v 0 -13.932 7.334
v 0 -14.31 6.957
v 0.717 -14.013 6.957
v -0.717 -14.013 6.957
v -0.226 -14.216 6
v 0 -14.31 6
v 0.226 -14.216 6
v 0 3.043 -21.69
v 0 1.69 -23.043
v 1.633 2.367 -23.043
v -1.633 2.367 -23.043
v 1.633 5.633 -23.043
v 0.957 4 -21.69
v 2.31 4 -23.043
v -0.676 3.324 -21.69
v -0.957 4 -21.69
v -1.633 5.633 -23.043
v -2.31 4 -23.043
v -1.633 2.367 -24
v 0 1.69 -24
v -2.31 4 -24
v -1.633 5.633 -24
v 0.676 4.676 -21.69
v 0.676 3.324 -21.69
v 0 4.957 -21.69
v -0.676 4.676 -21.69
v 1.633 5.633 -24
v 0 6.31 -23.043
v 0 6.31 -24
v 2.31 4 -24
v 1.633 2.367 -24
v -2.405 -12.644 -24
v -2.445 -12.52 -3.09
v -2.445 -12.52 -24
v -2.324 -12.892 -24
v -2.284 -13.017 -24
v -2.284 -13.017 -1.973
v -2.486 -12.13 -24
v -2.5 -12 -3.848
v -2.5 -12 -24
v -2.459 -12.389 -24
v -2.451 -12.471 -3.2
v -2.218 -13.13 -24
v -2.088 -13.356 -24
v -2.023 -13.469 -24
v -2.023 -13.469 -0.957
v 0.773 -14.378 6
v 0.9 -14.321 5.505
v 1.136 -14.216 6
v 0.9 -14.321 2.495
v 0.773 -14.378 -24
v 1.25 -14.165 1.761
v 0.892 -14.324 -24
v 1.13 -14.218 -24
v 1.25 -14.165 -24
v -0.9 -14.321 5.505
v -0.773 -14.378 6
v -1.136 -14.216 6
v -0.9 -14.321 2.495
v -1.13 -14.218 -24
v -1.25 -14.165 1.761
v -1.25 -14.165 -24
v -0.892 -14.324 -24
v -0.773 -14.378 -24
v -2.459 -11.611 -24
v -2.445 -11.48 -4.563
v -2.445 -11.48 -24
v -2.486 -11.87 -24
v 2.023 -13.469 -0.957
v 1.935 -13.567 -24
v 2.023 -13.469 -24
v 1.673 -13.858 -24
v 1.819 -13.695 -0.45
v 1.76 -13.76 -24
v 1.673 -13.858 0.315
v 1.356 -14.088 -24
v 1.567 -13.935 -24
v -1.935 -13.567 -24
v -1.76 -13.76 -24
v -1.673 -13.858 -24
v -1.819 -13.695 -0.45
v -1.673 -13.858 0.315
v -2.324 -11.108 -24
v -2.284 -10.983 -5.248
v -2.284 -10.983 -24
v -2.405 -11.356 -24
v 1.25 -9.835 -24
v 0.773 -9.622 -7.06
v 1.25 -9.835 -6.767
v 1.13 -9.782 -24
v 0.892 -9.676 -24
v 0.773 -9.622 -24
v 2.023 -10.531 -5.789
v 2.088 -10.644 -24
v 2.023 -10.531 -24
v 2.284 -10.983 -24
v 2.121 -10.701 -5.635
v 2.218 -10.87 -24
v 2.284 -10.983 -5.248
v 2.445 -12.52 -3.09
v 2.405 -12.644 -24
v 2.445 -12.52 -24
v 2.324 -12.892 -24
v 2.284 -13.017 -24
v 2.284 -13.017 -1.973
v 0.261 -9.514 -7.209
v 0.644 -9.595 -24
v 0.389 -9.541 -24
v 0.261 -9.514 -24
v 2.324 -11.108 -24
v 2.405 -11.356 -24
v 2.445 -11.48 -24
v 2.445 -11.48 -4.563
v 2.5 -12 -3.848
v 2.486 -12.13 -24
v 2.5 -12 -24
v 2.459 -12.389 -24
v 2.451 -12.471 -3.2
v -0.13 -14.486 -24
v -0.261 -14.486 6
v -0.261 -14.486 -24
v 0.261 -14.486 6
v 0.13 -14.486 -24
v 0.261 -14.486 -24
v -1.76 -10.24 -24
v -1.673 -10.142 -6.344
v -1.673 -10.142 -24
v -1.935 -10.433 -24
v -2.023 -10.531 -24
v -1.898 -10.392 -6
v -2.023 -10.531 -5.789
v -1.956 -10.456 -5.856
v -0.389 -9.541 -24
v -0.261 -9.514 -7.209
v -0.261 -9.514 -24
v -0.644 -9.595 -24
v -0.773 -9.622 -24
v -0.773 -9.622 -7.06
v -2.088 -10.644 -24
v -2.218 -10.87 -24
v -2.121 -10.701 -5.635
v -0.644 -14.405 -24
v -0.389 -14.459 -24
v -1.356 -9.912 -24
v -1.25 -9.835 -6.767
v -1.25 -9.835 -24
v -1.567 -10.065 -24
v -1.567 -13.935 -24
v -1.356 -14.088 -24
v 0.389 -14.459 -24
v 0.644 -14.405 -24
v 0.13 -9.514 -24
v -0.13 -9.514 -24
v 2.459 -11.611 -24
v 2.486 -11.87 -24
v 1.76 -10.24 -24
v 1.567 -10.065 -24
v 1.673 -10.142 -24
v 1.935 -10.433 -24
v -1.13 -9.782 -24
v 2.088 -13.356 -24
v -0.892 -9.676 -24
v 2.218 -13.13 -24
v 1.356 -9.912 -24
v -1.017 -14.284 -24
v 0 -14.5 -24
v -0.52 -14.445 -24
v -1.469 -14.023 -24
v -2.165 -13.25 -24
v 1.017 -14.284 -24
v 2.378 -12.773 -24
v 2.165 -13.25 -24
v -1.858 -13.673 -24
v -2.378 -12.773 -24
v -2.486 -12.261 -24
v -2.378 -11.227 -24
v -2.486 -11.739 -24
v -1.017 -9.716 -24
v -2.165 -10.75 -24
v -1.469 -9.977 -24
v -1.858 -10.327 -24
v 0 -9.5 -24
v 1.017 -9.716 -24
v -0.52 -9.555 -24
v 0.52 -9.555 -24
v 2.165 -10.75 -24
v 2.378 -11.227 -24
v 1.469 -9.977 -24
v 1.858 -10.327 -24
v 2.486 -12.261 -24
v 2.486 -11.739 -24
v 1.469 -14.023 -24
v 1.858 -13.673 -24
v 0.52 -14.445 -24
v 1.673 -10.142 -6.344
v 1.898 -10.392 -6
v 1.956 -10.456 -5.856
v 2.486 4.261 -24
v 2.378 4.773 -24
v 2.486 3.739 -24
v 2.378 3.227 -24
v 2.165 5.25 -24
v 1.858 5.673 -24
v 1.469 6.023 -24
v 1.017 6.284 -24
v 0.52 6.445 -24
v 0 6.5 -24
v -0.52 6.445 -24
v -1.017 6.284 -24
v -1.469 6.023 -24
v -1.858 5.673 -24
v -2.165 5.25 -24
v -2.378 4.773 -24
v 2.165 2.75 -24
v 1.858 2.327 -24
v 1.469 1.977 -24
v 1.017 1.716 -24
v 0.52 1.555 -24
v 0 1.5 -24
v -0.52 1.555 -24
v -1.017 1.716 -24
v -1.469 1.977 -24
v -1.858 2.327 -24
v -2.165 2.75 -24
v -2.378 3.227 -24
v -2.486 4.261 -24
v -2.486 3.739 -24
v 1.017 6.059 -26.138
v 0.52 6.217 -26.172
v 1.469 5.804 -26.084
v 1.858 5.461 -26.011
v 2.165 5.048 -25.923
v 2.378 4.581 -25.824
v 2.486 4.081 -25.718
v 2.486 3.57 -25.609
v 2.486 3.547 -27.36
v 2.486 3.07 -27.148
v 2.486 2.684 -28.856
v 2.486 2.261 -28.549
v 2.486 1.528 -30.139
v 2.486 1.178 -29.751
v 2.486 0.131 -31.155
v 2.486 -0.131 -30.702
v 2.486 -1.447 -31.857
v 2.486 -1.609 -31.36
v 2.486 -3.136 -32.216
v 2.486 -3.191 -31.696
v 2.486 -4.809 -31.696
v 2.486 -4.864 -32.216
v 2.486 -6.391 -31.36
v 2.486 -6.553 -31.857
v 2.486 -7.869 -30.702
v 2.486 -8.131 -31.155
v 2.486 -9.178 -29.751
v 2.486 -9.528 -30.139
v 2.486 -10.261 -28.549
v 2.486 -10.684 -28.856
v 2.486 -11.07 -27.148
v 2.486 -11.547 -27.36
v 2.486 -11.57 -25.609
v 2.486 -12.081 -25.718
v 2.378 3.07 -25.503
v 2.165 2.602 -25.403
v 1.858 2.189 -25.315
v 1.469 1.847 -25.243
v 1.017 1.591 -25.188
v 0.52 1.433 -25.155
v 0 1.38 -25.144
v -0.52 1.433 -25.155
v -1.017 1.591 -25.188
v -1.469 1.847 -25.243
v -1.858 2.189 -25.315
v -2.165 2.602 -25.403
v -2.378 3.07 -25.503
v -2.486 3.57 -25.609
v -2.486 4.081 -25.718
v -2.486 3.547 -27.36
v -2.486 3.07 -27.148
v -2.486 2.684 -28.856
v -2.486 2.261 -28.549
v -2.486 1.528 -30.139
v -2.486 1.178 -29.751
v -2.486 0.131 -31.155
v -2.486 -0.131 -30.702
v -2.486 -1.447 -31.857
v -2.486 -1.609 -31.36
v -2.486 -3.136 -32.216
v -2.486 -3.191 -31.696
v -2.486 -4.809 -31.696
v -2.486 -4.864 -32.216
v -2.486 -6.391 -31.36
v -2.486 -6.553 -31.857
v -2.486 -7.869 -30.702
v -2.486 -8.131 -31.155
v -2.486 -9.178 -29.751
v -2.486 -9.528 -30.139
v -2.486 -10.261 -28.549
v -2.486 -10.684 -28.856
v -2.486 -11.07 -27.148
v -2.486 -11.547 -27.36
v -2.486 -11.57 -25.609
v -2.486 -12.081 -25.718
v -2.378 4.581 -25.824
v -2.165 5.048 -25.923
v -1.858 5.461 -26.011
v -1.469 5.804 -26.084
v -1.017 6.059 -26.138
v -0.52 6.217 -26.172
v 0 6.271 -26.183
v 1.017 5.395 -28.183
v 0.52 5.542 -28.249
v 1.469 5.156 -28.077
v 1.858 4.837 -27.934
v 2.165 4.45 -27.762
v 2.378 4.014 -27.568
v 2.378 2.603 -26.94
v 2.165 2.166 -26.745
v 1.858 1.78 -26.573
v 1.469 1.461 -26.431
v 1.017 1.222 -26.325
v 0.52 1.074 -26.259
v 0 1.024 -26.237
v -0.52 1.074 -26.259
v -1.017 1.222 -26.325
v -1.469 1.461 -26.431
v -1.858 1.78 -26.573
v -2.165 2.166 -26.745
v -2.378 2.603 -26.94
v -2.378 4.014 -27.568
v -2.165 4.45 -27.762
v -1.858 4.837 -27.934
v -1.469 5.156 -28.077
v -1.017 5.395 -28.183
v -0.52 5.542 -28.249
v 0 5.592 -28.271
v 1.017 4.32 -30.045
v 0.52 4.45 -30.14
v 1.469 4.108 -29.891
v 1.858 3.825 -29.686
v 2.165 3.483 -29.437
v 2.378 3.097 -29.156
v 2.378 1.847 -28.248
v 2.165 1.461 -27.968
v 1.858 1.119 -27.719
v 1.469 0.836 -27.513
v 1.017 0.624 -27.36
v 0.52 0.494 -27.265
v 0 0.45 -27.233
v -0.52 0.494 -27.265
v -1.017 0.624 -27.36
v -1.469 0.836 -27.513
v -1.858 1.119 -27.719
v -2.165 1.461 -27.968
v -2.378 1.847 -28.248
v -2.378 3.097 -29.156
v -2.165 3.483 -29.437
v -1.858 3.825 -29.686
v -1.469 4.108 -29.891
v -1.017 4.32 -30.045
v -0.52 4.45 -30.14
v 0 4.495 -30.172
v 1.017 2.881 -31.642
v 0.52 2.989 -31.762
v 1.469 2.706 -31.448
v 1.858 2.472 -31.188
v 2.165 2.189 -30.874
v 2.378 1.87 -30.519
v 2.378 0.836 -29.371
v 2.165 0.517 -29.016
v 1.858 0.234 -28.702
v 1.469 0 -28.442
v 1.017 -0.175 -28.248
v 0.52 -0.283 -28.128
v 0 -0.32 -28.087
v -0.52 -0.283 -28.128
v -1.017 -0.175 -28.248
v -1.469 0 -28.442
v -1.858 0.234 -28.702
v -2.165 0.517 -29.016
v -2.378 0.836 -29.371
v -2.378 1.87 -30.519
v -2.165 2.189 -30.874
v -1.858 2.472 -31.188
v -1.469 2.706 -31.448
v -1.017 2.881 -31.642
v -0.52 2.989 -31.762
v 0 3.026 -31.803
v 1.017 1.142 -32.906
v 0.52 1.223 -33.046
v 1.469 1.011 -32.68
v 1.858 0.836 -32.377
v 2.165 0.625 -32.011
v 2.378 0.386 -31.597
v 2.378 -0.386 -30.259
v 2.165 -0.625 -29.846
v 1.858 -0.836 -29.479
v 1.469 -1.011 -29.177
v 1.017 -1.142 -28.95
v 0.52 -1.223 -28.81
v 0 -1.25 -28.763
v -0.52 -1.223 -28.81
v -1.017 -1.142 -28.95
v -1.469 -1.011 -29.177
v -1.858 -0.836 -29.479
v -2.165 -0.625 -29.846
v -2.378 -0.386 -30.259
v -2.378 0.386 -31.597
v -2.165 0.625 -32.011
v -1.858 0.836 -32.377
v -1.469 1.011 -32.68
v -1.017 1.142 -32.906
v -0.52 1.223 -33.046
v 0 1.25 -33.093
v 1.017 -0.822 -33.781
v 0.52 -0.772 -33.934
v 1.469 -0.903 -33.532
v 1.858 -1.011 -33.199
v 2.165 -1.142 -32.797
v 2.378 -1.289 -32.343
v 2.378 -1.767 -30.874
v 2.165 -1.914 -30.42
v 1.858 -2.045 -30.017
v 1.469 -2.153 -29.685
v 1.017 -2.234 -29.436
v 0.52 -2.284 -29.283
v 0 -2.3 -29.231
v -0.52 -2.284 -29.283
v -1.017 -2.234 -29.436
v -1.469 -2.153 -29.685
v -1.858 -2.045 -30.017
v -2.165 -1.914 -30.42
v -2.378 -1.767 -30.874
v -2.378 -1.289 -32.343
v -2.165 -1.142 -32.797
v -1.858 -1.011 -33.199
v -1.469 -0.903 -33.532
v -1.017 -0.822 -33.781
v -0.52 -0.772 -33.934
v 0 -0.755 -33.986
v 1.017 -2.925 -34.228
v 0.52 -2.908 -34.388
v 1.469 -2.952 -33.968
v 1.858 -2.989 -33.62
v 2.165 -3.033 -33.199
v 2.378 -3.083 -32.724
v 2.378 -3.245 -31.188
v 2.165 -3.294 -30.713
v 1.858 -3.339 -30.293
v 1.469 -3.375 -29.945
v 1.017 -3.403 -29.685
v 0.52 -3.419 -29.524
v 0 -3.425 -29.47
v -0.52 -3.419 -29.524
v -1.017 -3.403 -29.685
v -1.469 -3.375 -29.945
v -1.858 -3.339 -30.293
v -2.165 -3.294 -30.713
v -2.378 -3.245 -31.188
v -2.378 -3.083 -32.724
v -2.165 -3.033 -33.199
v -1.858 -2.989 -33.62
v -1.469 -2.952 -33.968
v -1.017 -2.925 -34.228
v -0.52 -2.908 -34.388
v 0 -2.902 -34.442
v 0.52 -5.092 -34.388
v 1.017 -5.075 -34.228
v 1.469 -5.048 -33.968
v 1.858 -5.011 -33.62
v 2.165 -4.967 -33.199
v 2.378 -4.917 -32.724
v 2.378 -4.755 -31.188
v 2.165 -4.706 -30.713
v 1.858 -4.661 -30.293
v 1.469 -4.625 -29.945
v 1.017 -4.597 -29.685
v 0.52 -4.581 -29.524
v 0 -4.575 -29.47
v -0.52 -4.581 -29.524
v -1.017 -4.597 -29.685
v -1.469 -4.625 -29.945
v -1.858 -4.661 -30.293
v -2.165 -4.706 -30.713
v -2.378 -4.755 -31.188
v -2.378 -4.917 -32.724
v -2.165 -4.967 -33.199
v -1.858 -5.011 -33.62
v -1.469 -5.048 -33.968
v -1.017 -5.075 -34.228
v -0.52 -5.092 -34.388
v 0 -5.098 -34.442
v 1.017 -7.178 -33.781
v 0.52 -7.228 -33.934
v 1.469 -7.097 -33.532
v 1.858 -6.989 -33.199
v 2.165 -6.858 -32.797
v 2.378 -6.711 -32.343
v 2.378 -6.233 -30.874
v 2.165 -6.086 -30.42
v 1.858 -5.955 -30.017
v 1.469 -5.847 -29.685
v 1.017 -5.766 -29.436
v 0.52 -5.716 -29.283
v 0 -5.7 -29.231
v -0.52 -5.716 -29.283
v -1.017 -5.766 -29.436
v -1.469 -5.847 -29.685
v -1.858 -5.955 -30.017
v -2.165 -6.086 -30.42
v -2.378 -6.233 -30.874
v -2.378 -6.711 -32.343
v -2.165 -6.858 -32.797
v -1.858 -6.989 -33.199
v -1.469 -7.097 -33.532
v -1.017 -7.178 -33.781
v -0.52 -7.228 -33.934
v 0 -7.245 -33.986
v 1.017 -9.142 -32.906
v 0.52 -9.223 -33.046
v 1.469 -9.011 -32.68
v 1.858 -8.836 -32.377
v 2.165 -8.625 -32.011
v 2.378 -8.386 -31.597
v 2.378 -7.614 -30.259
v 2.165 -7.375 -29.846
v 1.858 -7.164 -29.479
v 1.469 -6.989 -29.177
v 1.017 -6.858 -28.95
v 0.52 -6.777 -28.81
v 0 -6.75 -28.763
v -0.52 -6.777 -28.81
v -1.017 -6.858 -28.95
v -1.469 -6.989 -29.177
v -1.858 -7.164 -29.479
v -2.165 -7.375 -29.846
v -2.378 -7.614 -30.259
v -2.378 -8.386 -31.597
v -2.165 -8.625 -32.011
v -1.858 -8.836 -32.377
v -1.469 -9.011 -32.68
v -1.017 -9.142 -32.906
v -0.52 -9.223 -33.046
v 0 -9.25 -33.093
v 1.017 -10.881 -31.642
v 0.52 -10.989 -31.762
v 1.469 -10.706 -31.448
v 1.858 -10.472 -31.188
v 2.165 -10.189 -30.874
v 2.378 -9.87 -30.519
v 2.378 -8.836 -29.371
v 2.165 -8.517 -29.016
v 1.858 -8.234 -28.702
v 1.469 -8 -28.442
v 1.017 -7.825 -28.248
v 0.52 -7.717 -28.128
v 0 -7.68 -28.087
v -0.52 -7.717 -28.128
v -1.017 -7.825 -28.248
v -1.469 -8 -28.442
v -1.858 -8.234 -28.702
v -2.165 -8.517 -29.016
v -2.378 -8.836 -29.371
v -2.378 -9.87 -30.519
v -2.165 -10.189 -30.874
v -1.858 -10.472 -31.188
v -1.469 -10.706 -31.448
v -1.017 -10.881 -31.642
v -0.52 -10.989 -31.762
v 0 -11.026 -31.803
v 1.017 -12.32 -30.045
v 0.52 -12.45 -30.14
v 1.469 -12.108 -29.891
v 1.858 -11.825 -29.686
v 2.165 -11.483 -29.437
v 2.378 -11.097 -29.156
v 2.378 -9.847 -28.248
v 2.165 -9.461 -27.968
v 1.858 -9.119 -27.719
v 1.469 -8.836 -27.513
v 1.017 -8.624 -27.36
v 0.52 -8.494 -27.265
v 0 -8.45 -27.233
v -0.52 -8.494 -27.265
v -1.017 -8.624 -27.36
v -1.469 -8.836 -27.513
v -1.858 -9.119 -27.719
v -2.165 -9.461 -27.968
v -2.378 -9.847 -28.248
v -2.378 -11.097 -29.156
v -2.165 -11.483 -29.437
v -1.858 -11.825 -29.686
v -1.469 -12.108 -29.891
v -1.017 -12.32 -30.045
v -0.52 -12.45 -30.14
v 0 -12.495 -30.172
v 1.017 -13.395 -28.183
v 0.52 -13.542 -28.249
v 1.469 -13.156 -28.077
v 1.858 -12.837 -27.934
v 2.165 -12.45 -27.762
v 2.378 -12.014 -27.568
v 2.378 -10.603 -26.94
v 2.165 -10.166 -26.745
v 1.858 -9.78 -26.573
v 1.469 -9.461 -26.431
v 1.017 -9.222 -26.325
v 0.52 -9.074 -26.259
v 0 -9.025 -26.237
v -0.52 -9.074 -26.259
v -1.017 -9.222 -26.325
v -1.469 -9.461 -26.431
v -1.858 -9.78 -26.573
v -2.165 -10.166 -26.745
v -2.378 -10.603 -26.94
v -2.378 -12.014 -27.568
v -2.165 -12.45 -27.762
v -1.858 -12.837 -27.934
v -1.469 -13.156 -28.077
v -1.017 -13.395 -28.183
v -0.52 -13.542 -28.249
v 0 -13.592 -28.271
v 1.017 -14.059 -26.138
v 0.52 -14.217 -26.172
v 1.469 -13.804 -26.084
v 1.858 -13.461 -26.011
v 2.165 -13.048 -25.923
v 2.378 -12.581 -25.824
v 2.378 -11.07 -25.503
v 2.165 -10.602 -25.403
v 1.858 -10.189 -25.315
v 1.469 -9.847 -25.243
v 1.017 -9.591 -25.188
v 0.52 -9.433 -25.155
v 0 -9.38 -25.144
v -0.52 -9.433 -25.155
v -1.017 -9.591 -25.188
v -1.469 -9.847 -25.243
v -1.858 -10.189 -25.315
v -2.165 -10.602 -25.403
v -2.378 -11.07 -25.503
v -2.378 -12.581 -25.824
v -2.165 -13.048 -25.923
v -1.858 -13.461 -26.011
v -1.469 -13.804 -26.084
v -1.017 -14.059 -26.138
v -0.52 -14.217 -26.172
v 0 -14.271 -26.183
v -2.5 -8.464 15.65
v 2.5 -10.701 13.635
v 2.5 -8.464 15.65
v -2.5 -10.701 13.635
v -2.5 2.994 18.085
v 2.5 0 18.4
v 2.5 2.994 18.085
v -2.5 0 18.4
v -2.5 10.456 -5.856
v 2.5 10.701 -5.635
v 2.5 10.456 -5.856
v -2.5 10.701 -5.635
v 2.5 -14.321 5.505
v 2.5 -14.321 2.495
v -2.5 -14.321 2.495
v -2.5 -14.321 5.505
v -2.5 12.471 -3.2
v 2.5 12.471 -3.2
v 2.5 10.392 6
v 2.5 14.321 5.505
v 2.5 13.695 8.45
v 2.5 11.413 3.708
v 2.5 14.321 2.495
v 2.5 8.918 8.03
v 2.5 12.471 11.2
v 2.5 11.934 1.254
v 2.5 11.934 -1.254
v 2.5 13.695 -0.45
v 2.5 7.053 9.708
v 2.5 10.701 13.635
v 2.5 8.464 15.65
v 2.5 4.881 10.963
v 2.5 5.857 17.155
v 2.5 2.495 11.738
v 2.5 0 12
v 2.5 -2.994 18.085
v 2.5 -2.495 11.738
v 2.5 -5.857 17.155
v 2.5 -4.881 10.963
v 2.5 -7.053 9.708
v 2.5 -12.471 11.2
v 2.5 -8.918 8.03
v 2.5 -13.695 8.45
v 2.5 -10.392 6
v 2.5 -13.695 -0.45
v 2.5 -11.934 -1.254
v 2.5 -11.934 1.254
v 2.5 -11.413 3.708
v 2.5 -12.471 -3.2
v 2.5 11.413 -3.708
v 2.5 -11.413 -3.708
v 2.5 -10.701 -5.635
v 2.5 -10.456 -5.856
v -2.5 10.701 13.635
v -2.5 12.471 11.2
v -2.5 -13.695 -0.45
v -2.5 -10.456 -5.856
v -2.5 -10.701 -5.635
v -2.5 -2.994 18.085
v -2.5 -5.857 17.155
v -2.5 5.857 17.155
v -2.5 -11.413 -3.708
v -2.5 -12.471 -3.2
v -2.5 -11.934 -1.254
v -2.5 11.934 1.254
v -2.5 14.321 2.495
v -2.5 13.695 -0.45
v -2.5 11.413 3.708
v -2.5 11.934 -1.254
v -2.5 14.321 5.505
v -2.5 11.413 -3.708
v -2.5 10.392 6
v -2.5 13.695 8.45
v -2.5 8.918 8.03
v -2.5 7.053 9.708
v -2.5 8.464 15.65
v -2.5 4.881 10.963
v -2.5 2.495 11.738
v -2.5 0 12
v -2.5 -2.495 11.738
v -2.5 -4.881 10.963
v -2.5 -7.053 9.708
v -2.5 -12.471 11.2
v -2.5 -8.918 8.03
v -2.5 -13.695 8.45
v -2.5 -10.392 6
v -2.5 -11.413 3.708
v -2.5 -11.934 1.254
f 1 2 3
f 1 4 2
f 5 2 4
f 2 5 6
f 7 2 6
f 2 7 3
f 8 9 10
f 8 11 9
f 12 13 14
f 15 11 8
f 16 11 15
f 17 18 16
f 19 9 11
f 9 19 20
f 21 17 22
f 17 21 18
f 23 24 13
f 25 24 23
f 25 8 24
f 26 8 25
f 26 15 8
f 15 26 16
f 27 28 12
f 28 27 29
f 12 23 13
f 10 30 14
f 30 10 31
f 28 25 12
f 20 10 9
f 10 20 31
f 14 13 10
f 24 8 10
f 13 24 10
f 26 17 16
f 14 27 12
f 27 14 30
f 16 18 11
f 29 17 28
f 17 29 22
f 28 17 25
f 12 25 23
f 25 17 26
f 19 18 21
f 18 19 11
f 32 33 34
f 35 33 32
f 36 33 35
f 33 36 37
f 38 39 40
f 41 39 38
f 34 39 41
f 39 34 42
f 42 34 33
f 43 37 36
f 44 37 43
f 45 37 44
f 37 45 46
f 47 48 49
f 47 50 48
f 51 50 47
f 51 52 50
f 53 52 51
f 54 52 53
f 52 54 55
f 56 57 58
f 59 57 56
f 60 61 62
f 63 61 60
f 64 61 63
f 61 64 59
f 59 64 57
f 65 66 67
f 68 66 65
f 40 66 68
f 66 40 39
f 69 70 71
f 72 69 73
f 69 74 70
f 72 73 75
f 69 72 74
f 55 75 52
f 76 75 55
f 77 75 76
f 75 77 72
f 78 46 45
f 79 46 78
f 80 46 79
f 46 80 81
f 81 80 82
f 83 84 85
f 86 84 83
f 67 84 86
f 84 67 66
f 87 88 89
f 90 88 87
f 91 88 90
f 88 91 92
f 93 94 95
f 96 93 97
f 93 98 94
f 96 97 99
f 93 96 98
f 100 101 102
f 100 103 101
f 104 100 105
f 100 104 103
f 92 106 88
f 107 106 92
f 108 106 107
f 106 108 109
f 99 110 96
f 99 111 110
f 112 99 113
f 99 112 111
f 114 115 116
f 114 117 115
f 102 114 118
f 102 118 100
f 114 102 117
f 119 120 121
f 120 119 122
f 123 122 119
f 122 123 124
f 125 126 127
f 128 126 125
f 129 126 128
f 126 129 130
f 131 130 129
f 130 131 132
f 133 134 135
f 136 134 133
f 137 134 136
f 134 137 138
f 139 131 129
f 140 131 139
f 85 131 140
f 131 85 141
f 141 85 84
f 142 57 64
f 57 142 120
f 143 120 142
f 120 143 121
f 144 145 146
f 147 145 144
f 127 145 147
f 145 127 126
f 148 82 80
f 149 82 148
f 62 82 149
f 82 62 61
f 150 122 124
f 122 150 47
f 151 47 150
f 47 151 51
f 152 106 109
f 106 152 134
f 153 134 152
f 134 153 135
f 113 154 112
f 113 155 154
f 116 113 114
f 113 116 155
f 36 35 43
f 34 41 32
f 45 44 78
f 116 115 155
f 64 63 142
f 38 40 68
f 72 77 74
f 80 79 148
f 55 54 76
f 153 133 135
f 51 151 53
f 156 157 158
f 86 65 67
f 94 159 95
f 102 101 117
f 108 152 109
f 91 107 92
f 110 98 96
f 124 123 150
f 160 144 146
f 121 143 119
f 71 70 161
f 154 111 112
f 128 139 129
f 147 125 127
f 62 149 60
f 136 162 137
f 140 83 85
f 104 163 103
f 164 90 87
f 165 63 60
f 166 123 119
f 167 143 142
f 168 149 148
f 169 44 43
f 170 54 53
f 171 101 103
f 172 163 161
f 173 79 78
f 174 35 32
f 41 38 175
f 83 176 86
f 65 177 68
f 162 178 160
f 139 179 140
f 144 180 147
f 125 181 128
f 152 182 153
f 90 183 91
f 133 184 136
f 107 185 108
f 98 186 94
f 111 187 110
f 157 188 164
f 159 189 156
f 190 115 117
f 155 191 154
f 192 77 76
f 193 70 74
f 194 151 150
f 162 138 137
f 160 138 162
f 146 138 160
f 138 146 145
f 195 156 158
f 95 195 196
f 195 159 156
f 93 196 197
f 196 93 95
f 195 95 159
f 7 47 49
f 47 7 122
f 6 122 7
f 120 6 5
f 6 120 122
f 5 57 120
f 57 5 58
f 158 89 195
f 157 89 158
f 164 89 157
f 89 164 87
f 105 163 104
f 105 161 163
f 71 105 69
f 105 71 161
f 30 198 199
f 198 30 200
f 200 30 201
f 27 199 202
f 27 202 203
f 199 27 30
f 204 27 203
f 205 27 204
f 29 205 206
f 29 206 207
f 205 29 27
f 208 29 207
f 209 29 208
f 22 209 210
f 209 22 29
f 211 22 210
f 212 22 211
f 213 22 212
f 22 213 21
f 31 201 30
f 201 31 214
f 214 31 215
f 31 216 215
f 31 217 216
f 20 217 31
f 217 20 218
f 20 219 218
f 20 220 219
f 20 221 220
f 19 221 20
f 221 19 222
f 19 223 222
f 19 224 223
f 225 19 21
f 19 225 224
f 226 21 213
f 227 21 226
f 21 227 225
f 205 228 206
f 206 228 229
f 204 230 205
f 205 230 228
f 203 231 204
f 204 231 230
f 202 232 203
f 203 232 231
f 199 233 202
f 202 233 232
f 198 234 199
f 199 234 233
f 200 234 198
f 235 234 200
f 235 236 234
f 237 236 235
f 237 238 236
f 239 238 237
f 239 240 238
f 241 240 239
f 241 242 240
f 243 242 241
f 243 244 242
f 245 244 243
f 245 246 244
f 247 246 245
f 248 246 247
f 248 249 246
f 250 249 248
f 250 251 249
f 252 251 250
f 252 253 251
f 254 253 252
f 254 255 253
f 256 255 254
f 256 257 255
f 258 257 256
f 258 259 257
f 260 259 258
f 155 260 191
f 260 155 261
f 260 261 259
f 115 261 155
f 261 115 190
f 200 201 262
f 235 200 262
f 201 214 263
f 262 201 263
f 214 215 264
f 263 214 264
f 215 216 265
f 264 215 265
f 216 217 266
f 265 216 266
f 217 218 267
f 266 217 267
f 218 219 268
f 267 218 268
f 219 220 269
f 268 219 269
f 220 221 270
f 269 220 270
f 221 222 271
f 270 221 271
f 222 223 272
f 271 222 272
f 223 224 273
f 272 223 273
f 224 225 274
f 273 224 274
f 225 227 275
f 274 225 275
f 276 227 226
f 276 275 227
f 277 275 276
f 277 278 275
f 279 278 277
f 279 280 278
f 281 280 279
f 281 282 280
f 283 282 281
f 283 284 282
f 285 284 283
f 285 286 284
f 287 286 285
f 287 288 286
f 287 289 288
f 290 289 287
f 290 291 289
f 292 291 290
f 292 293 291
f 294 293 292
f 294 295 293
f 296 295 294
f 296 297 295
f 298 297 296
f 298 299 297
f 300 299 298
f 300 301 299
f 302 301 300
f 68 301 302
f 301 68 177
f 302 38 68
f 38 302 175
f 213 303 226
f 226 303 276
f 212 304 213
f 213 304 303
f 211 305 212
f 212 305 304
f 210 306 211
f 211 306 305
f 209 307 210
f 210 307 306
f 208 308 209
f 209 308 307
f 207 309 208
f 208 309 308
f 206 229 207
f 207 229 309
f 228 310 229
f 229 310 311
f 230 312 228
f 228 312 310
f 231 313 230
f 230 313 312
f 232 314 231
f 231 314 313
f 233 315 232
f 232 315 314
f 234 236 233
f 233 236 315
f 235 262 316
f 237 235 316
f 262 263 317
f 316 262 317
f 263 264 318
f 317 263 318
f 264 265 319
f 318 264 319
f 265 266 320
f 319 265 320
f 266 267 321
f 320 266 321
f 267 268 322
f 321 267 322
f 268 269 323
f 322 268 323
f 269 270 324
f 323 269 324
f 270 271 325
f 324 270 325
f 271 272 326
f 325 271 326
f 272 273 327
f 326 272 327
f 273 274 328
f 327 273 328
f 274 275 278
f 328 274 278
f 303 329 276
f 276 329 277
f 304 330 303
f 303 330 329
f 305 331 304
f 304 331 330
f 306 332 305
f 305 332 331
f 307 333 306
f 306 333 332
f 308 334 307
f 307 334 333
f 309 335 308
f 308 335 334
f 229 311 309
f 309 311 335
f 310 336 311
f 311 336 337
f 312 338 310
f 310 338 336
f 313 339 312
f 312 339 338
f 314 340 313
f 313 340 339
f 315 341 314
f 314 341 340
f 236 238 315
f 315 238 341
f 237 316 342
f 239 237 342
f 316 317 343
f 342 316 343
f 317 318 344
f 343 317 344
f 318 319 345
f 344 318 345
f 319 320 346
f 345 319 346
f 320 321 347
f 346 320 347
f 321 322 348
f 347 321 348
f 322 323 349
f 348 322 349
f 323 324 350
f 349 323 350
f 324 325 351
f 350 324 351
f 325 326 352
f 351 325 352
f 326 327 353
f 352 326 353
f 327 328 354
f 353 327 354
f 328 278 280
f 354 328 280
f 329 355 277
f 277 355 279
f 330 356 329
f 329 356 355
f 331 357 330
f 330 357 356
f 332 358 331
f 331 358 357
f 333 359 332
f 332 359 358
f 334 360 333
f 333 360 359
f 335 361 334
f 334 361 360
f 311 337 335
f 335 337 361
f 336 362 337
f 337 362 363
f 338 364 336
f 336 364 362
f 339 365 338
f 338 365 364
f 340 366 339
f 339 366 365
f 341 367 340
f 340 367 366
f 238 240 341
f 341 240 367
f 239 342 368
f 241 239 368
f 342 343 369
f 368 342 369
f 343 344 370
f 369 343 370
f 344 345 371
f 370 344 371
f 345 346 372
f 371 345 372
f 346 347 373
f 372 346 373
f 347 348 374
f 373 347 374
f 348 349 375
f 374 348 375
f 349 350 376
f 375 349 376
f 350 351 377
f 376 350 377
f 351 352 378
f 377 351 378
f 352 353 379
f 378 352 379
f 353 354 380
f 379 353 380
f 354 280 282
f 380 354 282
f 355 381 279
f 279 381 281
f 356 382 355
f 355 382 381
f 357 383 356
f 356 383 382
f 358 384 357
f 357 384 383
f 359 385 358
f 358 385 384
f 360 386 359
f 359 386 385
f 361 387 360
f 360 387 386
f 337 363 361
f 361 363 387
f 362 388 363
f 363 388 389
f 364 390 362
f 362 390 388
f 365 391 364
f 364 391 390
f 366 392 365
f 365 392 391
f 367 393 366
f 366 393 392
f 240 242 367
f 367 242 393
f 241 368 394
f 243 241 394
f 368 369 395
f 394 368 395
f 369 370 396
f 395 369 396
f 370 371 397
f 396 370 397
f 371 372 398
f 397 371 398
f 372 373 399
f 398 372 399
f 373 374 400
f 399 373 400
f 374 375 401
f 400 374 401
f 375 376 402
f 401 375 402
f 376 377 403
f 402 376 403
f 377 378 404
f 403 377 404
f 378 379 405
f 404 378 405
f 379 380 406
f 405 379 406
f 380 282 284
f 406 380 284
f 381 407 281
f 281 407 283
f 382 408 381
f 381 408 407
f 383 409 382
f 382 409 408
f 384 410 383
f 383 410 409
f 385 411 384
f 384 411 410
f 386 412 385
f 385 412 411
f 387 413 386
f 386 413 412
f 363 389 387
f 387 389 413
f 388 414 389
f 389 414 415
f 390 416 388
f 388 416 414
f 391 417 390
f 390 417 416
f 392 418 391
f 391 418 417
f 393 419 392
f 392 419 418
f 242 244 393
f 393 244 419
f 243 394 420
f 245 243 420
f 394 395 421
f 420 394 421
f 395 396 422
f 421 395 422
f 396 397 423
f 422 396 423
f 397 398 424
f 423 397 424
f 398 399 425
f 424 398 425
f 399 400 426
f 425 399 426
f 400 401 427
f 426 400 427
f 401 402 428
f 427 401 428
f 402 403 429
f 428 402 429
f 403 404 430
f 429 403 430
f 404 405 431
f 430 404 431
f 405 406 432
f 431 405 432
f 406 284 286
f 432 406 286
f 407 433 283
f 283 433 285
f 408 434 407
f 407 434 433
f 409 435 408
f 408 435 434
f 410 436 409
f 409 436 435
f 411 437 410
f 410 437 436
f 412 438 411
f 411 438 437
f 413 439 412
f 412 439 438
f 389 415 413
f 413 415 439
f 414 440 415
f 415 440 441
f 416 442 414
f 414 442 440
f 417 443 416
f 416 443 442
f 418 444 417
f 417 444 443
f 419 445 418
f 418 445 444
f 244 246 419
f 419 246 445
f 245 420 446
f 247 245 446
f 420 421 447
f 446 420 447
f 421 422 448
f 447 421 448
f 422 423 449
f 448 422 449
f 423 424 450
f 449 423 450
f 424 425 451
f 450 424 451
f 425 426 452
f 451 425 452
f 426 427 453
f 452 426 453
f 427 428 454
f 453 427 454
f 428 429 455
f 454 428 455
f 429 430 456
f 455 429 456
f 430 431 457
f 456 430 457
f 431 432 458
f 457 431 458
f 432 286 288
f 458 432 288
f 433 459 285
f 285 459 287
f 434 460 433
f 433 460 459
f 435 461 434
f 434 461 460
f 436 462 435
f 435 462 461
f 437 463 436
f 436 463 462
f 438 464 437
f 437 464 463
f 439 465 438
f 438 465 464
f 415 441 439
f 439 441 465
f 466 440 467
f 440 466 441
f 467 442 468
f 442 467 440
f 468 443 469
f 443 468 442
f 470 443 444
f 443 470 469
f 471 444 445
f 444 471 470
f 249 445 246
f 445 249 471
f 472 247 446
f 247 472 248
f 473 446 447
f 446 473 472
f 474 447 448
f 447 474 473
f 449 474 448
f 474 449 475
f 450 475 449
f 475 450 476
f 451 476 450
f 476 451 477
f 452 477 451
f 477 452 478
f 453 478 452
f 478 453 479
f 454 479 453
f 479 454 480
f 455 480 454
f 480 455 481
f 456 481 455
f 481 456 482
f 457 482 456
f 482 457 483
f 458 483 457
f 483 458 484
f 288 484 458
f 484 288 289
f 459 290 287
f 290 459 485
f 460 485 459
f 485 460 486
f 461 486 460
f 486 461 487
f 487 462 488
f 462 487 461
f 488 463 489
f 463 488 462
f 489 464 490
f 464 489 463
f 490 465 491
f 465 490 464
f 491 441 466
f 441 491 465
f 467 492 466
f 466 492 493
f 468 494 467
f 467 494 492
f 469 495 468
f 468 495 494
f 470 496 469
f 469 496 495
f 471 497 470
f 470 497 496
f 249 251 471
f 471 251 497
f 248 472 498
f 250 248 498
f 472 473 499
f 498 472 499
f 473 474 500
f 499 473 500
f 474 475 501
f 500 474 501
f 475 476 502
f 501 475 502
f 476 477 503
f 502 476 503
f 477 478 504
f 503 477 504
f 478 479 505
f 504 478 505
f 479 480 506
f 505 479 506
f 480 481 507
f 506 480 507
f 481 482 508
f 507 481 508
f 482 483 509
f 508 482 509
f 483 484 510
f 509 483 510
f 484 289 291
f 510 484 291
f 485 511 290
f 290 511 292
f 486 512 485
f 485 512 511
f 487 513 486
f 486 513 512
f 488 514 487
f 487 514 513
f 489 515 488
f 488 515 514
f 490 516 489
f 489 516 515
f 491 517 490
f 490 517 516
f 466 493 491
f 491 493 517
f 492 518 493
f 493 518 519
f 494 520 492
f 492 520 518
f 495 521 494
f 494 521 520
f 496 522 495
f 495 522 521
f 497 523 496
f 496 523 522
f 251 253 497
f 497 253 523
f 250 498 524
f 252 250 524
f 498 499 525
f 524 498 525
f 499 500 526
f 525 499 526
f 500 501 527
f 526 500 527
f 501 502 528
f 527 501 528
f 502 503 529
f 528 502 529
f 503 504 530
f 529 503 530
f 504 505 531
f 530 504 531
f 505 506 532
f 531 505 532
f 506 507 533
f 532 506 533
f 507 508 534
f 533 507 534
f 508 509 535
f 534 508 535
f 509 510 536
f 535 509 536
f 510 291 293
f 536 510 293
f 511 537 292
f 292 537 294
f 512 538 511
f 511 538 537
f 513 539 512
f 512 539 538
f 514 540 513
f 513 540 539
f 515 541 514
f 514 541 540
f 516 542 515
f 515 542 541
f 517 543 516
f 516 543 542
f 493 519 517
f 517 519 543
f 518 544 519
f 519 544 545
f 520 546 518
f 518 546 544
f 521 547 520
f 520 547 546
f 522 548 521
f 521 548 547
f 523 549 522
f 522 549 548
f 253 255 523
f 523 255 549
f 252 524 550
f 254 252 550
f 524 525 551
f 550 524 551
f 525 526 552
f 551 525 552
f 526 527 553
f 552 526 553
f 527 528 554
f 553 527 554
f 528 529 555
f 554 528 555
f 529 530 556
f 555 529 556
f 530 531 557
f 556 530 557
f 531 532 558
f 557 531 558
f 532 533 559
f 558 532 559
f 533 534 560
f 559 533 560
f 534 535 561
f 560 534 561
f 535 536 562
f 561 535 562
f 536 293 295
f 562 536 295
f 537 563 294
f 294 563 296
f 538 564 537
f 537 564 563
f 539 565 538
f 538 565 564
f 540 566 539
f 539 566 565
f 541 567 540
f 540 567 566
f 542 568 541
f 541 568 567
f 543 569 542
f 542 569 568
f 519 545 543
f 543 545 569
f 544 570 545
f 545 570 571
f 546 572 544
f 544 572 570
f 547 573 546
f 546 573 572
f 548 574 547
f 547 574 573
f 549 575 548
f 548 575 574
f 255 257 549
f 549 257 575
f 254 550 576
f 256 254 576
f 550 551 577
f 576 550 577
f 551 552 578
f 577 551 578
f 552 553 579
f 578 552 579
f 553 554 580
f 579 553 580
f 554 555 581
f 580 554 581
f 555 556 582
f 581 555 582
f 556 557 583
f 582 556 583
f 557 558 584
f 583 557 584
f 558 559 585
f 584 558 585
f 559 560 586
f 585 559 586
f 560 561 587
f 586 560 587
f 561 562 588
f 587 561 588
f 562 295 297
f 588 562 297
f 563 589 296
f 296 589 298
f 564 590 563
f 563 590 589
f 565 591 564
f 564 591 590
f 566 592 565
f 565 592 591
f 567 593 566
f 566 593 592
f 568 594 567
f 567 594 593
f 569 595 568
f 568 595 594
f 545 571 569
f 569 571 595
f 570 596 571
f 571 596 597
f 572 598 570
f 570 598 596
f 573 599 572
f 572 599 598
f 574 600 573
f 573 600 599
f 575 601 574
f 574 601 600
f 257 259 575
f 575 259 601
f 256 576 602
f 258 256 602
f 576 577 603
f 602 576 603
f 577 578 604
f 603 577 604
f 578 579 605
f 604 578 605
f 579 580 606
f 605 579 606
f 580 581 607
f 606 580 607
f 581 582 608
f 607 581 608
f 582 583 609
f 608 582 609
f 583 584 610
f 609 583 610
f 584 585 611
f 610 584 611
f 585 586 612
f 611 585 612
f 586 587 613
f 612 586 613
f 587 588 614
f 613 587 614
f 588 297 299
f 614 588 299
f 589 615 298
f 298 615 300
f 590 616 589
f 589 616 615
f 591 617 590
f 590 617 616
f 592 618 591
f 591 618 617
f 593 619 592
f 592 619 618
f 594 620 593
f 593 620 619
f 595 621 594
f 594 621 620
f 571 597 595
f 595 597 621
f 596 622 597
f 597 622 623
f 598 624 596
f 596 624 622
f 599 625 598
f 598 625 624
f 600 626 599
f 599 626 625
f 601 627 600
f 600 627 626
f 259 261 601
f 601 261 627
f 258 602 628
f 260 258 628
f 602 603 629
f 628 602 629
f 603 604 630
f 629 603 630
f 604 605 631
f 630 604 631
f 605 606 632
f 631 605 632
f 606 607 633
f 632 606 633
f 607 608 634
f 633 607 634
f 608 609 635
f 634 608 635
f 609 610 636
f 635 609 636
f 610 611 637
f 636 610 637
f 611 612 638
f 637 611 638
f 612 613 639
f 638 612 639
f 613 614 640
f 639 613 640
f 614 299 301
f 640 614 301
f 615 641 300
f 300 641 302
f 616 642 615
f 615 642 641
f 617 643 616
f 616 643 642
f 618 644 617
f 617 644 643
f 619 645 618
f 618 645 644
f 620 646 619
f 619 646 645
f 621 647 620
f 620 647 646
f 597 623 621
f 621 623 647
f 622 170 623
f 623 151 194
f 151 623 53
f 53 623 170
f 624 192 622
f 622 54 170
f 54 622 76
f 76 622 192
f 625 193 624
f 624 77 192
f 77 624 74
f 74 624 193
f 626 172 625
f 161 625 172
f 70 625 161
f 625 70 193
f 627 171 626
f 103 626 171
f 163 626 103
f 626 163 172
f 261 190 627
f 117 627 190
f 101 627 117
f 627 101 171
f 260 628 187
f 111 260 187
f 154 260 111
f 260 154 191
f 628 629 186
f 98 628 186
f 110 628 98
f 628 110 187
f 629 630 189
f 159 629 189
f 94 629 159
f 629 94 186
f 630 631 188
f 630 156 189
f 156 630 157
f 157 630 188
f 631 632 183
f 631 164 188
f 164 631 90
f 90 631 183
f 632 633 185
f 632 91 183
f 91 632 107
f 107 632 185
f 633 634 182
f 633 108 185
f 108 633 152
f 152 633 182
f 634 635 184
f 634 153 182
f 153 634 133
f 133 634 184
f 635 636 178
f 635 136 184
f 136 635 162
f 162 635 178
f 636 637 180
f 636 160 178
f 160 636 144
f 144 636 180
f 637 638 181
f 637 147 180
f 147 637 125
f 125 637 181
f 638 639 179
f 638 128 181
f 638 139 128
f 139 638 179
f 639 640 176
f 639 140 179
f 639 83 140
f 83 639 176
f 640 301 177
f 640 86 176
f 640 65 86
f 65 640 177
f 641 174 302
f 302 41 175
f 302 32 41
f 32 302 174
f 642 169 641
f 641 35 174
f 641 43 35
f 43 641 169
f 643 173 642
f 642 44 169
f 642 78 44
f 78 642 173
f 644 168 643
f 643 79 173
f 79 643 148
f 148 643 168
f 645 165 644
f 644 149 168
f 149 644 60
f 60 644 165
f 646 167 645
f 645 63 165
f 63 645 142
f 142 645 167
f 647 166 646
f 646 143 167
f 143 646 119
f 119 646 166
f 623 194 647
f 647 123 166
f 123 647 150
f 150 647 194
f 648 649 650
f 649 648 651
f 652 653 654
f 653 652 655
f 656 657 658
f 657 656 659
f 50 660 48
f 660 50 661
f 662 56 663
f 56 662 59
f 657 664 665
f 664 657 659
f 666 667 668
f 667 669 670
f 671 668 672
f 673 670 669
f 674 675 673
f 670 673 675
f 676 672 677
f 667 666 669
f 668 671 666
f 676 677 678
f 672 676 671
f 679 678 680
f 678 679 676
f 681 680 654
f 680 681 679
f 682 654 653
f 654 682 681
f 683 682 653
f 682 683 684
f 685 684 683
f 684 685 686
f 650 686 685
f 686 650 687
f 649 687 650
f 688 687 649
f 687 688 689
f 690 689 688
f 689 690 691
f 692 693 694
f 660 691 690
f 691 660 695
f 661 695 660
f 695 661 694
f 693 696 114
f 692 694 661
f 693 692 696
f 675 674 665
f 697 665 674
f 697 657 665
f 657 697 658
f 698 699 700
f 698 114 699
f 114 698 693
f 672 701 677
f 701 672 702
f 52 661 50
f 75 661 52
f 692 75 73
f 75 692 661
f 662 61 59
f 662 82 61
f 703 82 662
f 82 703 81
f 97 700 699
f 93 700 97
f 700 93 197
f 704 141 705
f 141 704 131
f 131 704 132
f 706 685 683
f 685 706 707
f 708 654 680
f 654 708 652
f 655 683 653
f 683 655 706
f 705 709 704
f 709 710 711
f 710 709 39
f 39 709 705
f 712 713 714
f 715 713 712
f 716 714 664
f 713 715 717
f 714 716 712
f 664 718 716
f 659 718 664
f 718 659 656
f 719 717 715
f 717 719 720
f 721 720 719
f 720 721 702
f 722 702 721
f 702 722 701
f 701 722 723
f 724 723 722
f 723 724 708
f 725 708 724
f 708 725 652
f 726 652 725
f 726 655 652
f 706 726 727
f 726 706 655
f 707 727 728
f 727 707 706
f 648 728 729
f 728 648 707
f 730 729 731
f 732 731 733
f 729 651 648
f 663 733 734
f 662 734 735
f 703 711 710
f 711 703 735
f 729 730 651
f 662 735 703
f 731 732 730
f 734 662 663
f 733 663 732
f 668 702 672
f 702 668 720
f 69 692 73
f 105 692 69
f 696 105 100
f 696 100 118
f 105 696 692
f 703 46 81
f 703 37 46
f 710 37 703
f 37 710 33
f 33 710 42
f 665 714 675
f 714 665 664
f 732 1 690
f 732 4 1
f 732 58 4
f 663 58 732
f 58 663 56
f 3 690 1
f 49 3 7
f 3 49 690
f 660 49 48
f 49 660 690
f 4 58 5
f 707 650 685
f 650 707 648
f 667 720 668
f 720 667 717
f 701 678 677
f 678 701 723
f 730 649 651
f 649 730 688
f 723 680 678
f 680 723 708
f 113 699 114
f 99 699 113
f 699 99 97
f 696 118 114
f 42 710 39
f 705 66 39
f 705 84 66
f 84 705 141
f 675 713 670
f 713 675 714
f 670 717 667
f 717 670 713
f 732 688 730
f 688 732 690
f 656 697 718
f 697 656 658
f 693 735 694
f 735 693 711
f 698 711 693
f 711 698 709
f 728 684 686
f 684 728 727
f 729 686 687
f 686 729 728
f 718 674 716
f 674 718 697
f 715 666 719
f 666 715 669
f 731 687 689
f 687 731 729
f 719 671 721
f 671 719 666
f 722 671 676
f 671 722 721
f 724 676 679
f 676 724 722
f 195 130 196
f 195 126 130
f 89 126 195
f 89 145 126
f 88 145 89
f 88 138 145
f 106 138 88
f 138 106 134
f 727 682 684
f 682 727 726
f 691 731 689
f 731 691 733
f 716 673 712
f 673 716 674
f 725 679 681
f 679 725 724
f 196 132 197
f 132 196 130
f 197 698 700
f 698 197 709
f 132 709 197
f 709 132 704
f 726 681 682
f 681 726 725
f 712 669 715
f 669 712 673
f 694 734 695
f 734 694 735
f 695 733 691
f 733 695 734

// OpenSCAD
include<lib.scad>



tubed=24;

hd=5;
hl=30;
e=8;

difference() {
    union() {
        translate([0,0,tubed/6]) rotate([0,90,0]) 
            cylinder(h=hd, d=tubed*1.2, center=true);
        translate([0,-tubed/2,-hl*0.8]) rotate([0,0,180]) 
            hook(hd,hl,e);
    }
    rotate([0,90,0]) 
        cylinder(h=hd*1.05, d=tubed, center=true);
}
